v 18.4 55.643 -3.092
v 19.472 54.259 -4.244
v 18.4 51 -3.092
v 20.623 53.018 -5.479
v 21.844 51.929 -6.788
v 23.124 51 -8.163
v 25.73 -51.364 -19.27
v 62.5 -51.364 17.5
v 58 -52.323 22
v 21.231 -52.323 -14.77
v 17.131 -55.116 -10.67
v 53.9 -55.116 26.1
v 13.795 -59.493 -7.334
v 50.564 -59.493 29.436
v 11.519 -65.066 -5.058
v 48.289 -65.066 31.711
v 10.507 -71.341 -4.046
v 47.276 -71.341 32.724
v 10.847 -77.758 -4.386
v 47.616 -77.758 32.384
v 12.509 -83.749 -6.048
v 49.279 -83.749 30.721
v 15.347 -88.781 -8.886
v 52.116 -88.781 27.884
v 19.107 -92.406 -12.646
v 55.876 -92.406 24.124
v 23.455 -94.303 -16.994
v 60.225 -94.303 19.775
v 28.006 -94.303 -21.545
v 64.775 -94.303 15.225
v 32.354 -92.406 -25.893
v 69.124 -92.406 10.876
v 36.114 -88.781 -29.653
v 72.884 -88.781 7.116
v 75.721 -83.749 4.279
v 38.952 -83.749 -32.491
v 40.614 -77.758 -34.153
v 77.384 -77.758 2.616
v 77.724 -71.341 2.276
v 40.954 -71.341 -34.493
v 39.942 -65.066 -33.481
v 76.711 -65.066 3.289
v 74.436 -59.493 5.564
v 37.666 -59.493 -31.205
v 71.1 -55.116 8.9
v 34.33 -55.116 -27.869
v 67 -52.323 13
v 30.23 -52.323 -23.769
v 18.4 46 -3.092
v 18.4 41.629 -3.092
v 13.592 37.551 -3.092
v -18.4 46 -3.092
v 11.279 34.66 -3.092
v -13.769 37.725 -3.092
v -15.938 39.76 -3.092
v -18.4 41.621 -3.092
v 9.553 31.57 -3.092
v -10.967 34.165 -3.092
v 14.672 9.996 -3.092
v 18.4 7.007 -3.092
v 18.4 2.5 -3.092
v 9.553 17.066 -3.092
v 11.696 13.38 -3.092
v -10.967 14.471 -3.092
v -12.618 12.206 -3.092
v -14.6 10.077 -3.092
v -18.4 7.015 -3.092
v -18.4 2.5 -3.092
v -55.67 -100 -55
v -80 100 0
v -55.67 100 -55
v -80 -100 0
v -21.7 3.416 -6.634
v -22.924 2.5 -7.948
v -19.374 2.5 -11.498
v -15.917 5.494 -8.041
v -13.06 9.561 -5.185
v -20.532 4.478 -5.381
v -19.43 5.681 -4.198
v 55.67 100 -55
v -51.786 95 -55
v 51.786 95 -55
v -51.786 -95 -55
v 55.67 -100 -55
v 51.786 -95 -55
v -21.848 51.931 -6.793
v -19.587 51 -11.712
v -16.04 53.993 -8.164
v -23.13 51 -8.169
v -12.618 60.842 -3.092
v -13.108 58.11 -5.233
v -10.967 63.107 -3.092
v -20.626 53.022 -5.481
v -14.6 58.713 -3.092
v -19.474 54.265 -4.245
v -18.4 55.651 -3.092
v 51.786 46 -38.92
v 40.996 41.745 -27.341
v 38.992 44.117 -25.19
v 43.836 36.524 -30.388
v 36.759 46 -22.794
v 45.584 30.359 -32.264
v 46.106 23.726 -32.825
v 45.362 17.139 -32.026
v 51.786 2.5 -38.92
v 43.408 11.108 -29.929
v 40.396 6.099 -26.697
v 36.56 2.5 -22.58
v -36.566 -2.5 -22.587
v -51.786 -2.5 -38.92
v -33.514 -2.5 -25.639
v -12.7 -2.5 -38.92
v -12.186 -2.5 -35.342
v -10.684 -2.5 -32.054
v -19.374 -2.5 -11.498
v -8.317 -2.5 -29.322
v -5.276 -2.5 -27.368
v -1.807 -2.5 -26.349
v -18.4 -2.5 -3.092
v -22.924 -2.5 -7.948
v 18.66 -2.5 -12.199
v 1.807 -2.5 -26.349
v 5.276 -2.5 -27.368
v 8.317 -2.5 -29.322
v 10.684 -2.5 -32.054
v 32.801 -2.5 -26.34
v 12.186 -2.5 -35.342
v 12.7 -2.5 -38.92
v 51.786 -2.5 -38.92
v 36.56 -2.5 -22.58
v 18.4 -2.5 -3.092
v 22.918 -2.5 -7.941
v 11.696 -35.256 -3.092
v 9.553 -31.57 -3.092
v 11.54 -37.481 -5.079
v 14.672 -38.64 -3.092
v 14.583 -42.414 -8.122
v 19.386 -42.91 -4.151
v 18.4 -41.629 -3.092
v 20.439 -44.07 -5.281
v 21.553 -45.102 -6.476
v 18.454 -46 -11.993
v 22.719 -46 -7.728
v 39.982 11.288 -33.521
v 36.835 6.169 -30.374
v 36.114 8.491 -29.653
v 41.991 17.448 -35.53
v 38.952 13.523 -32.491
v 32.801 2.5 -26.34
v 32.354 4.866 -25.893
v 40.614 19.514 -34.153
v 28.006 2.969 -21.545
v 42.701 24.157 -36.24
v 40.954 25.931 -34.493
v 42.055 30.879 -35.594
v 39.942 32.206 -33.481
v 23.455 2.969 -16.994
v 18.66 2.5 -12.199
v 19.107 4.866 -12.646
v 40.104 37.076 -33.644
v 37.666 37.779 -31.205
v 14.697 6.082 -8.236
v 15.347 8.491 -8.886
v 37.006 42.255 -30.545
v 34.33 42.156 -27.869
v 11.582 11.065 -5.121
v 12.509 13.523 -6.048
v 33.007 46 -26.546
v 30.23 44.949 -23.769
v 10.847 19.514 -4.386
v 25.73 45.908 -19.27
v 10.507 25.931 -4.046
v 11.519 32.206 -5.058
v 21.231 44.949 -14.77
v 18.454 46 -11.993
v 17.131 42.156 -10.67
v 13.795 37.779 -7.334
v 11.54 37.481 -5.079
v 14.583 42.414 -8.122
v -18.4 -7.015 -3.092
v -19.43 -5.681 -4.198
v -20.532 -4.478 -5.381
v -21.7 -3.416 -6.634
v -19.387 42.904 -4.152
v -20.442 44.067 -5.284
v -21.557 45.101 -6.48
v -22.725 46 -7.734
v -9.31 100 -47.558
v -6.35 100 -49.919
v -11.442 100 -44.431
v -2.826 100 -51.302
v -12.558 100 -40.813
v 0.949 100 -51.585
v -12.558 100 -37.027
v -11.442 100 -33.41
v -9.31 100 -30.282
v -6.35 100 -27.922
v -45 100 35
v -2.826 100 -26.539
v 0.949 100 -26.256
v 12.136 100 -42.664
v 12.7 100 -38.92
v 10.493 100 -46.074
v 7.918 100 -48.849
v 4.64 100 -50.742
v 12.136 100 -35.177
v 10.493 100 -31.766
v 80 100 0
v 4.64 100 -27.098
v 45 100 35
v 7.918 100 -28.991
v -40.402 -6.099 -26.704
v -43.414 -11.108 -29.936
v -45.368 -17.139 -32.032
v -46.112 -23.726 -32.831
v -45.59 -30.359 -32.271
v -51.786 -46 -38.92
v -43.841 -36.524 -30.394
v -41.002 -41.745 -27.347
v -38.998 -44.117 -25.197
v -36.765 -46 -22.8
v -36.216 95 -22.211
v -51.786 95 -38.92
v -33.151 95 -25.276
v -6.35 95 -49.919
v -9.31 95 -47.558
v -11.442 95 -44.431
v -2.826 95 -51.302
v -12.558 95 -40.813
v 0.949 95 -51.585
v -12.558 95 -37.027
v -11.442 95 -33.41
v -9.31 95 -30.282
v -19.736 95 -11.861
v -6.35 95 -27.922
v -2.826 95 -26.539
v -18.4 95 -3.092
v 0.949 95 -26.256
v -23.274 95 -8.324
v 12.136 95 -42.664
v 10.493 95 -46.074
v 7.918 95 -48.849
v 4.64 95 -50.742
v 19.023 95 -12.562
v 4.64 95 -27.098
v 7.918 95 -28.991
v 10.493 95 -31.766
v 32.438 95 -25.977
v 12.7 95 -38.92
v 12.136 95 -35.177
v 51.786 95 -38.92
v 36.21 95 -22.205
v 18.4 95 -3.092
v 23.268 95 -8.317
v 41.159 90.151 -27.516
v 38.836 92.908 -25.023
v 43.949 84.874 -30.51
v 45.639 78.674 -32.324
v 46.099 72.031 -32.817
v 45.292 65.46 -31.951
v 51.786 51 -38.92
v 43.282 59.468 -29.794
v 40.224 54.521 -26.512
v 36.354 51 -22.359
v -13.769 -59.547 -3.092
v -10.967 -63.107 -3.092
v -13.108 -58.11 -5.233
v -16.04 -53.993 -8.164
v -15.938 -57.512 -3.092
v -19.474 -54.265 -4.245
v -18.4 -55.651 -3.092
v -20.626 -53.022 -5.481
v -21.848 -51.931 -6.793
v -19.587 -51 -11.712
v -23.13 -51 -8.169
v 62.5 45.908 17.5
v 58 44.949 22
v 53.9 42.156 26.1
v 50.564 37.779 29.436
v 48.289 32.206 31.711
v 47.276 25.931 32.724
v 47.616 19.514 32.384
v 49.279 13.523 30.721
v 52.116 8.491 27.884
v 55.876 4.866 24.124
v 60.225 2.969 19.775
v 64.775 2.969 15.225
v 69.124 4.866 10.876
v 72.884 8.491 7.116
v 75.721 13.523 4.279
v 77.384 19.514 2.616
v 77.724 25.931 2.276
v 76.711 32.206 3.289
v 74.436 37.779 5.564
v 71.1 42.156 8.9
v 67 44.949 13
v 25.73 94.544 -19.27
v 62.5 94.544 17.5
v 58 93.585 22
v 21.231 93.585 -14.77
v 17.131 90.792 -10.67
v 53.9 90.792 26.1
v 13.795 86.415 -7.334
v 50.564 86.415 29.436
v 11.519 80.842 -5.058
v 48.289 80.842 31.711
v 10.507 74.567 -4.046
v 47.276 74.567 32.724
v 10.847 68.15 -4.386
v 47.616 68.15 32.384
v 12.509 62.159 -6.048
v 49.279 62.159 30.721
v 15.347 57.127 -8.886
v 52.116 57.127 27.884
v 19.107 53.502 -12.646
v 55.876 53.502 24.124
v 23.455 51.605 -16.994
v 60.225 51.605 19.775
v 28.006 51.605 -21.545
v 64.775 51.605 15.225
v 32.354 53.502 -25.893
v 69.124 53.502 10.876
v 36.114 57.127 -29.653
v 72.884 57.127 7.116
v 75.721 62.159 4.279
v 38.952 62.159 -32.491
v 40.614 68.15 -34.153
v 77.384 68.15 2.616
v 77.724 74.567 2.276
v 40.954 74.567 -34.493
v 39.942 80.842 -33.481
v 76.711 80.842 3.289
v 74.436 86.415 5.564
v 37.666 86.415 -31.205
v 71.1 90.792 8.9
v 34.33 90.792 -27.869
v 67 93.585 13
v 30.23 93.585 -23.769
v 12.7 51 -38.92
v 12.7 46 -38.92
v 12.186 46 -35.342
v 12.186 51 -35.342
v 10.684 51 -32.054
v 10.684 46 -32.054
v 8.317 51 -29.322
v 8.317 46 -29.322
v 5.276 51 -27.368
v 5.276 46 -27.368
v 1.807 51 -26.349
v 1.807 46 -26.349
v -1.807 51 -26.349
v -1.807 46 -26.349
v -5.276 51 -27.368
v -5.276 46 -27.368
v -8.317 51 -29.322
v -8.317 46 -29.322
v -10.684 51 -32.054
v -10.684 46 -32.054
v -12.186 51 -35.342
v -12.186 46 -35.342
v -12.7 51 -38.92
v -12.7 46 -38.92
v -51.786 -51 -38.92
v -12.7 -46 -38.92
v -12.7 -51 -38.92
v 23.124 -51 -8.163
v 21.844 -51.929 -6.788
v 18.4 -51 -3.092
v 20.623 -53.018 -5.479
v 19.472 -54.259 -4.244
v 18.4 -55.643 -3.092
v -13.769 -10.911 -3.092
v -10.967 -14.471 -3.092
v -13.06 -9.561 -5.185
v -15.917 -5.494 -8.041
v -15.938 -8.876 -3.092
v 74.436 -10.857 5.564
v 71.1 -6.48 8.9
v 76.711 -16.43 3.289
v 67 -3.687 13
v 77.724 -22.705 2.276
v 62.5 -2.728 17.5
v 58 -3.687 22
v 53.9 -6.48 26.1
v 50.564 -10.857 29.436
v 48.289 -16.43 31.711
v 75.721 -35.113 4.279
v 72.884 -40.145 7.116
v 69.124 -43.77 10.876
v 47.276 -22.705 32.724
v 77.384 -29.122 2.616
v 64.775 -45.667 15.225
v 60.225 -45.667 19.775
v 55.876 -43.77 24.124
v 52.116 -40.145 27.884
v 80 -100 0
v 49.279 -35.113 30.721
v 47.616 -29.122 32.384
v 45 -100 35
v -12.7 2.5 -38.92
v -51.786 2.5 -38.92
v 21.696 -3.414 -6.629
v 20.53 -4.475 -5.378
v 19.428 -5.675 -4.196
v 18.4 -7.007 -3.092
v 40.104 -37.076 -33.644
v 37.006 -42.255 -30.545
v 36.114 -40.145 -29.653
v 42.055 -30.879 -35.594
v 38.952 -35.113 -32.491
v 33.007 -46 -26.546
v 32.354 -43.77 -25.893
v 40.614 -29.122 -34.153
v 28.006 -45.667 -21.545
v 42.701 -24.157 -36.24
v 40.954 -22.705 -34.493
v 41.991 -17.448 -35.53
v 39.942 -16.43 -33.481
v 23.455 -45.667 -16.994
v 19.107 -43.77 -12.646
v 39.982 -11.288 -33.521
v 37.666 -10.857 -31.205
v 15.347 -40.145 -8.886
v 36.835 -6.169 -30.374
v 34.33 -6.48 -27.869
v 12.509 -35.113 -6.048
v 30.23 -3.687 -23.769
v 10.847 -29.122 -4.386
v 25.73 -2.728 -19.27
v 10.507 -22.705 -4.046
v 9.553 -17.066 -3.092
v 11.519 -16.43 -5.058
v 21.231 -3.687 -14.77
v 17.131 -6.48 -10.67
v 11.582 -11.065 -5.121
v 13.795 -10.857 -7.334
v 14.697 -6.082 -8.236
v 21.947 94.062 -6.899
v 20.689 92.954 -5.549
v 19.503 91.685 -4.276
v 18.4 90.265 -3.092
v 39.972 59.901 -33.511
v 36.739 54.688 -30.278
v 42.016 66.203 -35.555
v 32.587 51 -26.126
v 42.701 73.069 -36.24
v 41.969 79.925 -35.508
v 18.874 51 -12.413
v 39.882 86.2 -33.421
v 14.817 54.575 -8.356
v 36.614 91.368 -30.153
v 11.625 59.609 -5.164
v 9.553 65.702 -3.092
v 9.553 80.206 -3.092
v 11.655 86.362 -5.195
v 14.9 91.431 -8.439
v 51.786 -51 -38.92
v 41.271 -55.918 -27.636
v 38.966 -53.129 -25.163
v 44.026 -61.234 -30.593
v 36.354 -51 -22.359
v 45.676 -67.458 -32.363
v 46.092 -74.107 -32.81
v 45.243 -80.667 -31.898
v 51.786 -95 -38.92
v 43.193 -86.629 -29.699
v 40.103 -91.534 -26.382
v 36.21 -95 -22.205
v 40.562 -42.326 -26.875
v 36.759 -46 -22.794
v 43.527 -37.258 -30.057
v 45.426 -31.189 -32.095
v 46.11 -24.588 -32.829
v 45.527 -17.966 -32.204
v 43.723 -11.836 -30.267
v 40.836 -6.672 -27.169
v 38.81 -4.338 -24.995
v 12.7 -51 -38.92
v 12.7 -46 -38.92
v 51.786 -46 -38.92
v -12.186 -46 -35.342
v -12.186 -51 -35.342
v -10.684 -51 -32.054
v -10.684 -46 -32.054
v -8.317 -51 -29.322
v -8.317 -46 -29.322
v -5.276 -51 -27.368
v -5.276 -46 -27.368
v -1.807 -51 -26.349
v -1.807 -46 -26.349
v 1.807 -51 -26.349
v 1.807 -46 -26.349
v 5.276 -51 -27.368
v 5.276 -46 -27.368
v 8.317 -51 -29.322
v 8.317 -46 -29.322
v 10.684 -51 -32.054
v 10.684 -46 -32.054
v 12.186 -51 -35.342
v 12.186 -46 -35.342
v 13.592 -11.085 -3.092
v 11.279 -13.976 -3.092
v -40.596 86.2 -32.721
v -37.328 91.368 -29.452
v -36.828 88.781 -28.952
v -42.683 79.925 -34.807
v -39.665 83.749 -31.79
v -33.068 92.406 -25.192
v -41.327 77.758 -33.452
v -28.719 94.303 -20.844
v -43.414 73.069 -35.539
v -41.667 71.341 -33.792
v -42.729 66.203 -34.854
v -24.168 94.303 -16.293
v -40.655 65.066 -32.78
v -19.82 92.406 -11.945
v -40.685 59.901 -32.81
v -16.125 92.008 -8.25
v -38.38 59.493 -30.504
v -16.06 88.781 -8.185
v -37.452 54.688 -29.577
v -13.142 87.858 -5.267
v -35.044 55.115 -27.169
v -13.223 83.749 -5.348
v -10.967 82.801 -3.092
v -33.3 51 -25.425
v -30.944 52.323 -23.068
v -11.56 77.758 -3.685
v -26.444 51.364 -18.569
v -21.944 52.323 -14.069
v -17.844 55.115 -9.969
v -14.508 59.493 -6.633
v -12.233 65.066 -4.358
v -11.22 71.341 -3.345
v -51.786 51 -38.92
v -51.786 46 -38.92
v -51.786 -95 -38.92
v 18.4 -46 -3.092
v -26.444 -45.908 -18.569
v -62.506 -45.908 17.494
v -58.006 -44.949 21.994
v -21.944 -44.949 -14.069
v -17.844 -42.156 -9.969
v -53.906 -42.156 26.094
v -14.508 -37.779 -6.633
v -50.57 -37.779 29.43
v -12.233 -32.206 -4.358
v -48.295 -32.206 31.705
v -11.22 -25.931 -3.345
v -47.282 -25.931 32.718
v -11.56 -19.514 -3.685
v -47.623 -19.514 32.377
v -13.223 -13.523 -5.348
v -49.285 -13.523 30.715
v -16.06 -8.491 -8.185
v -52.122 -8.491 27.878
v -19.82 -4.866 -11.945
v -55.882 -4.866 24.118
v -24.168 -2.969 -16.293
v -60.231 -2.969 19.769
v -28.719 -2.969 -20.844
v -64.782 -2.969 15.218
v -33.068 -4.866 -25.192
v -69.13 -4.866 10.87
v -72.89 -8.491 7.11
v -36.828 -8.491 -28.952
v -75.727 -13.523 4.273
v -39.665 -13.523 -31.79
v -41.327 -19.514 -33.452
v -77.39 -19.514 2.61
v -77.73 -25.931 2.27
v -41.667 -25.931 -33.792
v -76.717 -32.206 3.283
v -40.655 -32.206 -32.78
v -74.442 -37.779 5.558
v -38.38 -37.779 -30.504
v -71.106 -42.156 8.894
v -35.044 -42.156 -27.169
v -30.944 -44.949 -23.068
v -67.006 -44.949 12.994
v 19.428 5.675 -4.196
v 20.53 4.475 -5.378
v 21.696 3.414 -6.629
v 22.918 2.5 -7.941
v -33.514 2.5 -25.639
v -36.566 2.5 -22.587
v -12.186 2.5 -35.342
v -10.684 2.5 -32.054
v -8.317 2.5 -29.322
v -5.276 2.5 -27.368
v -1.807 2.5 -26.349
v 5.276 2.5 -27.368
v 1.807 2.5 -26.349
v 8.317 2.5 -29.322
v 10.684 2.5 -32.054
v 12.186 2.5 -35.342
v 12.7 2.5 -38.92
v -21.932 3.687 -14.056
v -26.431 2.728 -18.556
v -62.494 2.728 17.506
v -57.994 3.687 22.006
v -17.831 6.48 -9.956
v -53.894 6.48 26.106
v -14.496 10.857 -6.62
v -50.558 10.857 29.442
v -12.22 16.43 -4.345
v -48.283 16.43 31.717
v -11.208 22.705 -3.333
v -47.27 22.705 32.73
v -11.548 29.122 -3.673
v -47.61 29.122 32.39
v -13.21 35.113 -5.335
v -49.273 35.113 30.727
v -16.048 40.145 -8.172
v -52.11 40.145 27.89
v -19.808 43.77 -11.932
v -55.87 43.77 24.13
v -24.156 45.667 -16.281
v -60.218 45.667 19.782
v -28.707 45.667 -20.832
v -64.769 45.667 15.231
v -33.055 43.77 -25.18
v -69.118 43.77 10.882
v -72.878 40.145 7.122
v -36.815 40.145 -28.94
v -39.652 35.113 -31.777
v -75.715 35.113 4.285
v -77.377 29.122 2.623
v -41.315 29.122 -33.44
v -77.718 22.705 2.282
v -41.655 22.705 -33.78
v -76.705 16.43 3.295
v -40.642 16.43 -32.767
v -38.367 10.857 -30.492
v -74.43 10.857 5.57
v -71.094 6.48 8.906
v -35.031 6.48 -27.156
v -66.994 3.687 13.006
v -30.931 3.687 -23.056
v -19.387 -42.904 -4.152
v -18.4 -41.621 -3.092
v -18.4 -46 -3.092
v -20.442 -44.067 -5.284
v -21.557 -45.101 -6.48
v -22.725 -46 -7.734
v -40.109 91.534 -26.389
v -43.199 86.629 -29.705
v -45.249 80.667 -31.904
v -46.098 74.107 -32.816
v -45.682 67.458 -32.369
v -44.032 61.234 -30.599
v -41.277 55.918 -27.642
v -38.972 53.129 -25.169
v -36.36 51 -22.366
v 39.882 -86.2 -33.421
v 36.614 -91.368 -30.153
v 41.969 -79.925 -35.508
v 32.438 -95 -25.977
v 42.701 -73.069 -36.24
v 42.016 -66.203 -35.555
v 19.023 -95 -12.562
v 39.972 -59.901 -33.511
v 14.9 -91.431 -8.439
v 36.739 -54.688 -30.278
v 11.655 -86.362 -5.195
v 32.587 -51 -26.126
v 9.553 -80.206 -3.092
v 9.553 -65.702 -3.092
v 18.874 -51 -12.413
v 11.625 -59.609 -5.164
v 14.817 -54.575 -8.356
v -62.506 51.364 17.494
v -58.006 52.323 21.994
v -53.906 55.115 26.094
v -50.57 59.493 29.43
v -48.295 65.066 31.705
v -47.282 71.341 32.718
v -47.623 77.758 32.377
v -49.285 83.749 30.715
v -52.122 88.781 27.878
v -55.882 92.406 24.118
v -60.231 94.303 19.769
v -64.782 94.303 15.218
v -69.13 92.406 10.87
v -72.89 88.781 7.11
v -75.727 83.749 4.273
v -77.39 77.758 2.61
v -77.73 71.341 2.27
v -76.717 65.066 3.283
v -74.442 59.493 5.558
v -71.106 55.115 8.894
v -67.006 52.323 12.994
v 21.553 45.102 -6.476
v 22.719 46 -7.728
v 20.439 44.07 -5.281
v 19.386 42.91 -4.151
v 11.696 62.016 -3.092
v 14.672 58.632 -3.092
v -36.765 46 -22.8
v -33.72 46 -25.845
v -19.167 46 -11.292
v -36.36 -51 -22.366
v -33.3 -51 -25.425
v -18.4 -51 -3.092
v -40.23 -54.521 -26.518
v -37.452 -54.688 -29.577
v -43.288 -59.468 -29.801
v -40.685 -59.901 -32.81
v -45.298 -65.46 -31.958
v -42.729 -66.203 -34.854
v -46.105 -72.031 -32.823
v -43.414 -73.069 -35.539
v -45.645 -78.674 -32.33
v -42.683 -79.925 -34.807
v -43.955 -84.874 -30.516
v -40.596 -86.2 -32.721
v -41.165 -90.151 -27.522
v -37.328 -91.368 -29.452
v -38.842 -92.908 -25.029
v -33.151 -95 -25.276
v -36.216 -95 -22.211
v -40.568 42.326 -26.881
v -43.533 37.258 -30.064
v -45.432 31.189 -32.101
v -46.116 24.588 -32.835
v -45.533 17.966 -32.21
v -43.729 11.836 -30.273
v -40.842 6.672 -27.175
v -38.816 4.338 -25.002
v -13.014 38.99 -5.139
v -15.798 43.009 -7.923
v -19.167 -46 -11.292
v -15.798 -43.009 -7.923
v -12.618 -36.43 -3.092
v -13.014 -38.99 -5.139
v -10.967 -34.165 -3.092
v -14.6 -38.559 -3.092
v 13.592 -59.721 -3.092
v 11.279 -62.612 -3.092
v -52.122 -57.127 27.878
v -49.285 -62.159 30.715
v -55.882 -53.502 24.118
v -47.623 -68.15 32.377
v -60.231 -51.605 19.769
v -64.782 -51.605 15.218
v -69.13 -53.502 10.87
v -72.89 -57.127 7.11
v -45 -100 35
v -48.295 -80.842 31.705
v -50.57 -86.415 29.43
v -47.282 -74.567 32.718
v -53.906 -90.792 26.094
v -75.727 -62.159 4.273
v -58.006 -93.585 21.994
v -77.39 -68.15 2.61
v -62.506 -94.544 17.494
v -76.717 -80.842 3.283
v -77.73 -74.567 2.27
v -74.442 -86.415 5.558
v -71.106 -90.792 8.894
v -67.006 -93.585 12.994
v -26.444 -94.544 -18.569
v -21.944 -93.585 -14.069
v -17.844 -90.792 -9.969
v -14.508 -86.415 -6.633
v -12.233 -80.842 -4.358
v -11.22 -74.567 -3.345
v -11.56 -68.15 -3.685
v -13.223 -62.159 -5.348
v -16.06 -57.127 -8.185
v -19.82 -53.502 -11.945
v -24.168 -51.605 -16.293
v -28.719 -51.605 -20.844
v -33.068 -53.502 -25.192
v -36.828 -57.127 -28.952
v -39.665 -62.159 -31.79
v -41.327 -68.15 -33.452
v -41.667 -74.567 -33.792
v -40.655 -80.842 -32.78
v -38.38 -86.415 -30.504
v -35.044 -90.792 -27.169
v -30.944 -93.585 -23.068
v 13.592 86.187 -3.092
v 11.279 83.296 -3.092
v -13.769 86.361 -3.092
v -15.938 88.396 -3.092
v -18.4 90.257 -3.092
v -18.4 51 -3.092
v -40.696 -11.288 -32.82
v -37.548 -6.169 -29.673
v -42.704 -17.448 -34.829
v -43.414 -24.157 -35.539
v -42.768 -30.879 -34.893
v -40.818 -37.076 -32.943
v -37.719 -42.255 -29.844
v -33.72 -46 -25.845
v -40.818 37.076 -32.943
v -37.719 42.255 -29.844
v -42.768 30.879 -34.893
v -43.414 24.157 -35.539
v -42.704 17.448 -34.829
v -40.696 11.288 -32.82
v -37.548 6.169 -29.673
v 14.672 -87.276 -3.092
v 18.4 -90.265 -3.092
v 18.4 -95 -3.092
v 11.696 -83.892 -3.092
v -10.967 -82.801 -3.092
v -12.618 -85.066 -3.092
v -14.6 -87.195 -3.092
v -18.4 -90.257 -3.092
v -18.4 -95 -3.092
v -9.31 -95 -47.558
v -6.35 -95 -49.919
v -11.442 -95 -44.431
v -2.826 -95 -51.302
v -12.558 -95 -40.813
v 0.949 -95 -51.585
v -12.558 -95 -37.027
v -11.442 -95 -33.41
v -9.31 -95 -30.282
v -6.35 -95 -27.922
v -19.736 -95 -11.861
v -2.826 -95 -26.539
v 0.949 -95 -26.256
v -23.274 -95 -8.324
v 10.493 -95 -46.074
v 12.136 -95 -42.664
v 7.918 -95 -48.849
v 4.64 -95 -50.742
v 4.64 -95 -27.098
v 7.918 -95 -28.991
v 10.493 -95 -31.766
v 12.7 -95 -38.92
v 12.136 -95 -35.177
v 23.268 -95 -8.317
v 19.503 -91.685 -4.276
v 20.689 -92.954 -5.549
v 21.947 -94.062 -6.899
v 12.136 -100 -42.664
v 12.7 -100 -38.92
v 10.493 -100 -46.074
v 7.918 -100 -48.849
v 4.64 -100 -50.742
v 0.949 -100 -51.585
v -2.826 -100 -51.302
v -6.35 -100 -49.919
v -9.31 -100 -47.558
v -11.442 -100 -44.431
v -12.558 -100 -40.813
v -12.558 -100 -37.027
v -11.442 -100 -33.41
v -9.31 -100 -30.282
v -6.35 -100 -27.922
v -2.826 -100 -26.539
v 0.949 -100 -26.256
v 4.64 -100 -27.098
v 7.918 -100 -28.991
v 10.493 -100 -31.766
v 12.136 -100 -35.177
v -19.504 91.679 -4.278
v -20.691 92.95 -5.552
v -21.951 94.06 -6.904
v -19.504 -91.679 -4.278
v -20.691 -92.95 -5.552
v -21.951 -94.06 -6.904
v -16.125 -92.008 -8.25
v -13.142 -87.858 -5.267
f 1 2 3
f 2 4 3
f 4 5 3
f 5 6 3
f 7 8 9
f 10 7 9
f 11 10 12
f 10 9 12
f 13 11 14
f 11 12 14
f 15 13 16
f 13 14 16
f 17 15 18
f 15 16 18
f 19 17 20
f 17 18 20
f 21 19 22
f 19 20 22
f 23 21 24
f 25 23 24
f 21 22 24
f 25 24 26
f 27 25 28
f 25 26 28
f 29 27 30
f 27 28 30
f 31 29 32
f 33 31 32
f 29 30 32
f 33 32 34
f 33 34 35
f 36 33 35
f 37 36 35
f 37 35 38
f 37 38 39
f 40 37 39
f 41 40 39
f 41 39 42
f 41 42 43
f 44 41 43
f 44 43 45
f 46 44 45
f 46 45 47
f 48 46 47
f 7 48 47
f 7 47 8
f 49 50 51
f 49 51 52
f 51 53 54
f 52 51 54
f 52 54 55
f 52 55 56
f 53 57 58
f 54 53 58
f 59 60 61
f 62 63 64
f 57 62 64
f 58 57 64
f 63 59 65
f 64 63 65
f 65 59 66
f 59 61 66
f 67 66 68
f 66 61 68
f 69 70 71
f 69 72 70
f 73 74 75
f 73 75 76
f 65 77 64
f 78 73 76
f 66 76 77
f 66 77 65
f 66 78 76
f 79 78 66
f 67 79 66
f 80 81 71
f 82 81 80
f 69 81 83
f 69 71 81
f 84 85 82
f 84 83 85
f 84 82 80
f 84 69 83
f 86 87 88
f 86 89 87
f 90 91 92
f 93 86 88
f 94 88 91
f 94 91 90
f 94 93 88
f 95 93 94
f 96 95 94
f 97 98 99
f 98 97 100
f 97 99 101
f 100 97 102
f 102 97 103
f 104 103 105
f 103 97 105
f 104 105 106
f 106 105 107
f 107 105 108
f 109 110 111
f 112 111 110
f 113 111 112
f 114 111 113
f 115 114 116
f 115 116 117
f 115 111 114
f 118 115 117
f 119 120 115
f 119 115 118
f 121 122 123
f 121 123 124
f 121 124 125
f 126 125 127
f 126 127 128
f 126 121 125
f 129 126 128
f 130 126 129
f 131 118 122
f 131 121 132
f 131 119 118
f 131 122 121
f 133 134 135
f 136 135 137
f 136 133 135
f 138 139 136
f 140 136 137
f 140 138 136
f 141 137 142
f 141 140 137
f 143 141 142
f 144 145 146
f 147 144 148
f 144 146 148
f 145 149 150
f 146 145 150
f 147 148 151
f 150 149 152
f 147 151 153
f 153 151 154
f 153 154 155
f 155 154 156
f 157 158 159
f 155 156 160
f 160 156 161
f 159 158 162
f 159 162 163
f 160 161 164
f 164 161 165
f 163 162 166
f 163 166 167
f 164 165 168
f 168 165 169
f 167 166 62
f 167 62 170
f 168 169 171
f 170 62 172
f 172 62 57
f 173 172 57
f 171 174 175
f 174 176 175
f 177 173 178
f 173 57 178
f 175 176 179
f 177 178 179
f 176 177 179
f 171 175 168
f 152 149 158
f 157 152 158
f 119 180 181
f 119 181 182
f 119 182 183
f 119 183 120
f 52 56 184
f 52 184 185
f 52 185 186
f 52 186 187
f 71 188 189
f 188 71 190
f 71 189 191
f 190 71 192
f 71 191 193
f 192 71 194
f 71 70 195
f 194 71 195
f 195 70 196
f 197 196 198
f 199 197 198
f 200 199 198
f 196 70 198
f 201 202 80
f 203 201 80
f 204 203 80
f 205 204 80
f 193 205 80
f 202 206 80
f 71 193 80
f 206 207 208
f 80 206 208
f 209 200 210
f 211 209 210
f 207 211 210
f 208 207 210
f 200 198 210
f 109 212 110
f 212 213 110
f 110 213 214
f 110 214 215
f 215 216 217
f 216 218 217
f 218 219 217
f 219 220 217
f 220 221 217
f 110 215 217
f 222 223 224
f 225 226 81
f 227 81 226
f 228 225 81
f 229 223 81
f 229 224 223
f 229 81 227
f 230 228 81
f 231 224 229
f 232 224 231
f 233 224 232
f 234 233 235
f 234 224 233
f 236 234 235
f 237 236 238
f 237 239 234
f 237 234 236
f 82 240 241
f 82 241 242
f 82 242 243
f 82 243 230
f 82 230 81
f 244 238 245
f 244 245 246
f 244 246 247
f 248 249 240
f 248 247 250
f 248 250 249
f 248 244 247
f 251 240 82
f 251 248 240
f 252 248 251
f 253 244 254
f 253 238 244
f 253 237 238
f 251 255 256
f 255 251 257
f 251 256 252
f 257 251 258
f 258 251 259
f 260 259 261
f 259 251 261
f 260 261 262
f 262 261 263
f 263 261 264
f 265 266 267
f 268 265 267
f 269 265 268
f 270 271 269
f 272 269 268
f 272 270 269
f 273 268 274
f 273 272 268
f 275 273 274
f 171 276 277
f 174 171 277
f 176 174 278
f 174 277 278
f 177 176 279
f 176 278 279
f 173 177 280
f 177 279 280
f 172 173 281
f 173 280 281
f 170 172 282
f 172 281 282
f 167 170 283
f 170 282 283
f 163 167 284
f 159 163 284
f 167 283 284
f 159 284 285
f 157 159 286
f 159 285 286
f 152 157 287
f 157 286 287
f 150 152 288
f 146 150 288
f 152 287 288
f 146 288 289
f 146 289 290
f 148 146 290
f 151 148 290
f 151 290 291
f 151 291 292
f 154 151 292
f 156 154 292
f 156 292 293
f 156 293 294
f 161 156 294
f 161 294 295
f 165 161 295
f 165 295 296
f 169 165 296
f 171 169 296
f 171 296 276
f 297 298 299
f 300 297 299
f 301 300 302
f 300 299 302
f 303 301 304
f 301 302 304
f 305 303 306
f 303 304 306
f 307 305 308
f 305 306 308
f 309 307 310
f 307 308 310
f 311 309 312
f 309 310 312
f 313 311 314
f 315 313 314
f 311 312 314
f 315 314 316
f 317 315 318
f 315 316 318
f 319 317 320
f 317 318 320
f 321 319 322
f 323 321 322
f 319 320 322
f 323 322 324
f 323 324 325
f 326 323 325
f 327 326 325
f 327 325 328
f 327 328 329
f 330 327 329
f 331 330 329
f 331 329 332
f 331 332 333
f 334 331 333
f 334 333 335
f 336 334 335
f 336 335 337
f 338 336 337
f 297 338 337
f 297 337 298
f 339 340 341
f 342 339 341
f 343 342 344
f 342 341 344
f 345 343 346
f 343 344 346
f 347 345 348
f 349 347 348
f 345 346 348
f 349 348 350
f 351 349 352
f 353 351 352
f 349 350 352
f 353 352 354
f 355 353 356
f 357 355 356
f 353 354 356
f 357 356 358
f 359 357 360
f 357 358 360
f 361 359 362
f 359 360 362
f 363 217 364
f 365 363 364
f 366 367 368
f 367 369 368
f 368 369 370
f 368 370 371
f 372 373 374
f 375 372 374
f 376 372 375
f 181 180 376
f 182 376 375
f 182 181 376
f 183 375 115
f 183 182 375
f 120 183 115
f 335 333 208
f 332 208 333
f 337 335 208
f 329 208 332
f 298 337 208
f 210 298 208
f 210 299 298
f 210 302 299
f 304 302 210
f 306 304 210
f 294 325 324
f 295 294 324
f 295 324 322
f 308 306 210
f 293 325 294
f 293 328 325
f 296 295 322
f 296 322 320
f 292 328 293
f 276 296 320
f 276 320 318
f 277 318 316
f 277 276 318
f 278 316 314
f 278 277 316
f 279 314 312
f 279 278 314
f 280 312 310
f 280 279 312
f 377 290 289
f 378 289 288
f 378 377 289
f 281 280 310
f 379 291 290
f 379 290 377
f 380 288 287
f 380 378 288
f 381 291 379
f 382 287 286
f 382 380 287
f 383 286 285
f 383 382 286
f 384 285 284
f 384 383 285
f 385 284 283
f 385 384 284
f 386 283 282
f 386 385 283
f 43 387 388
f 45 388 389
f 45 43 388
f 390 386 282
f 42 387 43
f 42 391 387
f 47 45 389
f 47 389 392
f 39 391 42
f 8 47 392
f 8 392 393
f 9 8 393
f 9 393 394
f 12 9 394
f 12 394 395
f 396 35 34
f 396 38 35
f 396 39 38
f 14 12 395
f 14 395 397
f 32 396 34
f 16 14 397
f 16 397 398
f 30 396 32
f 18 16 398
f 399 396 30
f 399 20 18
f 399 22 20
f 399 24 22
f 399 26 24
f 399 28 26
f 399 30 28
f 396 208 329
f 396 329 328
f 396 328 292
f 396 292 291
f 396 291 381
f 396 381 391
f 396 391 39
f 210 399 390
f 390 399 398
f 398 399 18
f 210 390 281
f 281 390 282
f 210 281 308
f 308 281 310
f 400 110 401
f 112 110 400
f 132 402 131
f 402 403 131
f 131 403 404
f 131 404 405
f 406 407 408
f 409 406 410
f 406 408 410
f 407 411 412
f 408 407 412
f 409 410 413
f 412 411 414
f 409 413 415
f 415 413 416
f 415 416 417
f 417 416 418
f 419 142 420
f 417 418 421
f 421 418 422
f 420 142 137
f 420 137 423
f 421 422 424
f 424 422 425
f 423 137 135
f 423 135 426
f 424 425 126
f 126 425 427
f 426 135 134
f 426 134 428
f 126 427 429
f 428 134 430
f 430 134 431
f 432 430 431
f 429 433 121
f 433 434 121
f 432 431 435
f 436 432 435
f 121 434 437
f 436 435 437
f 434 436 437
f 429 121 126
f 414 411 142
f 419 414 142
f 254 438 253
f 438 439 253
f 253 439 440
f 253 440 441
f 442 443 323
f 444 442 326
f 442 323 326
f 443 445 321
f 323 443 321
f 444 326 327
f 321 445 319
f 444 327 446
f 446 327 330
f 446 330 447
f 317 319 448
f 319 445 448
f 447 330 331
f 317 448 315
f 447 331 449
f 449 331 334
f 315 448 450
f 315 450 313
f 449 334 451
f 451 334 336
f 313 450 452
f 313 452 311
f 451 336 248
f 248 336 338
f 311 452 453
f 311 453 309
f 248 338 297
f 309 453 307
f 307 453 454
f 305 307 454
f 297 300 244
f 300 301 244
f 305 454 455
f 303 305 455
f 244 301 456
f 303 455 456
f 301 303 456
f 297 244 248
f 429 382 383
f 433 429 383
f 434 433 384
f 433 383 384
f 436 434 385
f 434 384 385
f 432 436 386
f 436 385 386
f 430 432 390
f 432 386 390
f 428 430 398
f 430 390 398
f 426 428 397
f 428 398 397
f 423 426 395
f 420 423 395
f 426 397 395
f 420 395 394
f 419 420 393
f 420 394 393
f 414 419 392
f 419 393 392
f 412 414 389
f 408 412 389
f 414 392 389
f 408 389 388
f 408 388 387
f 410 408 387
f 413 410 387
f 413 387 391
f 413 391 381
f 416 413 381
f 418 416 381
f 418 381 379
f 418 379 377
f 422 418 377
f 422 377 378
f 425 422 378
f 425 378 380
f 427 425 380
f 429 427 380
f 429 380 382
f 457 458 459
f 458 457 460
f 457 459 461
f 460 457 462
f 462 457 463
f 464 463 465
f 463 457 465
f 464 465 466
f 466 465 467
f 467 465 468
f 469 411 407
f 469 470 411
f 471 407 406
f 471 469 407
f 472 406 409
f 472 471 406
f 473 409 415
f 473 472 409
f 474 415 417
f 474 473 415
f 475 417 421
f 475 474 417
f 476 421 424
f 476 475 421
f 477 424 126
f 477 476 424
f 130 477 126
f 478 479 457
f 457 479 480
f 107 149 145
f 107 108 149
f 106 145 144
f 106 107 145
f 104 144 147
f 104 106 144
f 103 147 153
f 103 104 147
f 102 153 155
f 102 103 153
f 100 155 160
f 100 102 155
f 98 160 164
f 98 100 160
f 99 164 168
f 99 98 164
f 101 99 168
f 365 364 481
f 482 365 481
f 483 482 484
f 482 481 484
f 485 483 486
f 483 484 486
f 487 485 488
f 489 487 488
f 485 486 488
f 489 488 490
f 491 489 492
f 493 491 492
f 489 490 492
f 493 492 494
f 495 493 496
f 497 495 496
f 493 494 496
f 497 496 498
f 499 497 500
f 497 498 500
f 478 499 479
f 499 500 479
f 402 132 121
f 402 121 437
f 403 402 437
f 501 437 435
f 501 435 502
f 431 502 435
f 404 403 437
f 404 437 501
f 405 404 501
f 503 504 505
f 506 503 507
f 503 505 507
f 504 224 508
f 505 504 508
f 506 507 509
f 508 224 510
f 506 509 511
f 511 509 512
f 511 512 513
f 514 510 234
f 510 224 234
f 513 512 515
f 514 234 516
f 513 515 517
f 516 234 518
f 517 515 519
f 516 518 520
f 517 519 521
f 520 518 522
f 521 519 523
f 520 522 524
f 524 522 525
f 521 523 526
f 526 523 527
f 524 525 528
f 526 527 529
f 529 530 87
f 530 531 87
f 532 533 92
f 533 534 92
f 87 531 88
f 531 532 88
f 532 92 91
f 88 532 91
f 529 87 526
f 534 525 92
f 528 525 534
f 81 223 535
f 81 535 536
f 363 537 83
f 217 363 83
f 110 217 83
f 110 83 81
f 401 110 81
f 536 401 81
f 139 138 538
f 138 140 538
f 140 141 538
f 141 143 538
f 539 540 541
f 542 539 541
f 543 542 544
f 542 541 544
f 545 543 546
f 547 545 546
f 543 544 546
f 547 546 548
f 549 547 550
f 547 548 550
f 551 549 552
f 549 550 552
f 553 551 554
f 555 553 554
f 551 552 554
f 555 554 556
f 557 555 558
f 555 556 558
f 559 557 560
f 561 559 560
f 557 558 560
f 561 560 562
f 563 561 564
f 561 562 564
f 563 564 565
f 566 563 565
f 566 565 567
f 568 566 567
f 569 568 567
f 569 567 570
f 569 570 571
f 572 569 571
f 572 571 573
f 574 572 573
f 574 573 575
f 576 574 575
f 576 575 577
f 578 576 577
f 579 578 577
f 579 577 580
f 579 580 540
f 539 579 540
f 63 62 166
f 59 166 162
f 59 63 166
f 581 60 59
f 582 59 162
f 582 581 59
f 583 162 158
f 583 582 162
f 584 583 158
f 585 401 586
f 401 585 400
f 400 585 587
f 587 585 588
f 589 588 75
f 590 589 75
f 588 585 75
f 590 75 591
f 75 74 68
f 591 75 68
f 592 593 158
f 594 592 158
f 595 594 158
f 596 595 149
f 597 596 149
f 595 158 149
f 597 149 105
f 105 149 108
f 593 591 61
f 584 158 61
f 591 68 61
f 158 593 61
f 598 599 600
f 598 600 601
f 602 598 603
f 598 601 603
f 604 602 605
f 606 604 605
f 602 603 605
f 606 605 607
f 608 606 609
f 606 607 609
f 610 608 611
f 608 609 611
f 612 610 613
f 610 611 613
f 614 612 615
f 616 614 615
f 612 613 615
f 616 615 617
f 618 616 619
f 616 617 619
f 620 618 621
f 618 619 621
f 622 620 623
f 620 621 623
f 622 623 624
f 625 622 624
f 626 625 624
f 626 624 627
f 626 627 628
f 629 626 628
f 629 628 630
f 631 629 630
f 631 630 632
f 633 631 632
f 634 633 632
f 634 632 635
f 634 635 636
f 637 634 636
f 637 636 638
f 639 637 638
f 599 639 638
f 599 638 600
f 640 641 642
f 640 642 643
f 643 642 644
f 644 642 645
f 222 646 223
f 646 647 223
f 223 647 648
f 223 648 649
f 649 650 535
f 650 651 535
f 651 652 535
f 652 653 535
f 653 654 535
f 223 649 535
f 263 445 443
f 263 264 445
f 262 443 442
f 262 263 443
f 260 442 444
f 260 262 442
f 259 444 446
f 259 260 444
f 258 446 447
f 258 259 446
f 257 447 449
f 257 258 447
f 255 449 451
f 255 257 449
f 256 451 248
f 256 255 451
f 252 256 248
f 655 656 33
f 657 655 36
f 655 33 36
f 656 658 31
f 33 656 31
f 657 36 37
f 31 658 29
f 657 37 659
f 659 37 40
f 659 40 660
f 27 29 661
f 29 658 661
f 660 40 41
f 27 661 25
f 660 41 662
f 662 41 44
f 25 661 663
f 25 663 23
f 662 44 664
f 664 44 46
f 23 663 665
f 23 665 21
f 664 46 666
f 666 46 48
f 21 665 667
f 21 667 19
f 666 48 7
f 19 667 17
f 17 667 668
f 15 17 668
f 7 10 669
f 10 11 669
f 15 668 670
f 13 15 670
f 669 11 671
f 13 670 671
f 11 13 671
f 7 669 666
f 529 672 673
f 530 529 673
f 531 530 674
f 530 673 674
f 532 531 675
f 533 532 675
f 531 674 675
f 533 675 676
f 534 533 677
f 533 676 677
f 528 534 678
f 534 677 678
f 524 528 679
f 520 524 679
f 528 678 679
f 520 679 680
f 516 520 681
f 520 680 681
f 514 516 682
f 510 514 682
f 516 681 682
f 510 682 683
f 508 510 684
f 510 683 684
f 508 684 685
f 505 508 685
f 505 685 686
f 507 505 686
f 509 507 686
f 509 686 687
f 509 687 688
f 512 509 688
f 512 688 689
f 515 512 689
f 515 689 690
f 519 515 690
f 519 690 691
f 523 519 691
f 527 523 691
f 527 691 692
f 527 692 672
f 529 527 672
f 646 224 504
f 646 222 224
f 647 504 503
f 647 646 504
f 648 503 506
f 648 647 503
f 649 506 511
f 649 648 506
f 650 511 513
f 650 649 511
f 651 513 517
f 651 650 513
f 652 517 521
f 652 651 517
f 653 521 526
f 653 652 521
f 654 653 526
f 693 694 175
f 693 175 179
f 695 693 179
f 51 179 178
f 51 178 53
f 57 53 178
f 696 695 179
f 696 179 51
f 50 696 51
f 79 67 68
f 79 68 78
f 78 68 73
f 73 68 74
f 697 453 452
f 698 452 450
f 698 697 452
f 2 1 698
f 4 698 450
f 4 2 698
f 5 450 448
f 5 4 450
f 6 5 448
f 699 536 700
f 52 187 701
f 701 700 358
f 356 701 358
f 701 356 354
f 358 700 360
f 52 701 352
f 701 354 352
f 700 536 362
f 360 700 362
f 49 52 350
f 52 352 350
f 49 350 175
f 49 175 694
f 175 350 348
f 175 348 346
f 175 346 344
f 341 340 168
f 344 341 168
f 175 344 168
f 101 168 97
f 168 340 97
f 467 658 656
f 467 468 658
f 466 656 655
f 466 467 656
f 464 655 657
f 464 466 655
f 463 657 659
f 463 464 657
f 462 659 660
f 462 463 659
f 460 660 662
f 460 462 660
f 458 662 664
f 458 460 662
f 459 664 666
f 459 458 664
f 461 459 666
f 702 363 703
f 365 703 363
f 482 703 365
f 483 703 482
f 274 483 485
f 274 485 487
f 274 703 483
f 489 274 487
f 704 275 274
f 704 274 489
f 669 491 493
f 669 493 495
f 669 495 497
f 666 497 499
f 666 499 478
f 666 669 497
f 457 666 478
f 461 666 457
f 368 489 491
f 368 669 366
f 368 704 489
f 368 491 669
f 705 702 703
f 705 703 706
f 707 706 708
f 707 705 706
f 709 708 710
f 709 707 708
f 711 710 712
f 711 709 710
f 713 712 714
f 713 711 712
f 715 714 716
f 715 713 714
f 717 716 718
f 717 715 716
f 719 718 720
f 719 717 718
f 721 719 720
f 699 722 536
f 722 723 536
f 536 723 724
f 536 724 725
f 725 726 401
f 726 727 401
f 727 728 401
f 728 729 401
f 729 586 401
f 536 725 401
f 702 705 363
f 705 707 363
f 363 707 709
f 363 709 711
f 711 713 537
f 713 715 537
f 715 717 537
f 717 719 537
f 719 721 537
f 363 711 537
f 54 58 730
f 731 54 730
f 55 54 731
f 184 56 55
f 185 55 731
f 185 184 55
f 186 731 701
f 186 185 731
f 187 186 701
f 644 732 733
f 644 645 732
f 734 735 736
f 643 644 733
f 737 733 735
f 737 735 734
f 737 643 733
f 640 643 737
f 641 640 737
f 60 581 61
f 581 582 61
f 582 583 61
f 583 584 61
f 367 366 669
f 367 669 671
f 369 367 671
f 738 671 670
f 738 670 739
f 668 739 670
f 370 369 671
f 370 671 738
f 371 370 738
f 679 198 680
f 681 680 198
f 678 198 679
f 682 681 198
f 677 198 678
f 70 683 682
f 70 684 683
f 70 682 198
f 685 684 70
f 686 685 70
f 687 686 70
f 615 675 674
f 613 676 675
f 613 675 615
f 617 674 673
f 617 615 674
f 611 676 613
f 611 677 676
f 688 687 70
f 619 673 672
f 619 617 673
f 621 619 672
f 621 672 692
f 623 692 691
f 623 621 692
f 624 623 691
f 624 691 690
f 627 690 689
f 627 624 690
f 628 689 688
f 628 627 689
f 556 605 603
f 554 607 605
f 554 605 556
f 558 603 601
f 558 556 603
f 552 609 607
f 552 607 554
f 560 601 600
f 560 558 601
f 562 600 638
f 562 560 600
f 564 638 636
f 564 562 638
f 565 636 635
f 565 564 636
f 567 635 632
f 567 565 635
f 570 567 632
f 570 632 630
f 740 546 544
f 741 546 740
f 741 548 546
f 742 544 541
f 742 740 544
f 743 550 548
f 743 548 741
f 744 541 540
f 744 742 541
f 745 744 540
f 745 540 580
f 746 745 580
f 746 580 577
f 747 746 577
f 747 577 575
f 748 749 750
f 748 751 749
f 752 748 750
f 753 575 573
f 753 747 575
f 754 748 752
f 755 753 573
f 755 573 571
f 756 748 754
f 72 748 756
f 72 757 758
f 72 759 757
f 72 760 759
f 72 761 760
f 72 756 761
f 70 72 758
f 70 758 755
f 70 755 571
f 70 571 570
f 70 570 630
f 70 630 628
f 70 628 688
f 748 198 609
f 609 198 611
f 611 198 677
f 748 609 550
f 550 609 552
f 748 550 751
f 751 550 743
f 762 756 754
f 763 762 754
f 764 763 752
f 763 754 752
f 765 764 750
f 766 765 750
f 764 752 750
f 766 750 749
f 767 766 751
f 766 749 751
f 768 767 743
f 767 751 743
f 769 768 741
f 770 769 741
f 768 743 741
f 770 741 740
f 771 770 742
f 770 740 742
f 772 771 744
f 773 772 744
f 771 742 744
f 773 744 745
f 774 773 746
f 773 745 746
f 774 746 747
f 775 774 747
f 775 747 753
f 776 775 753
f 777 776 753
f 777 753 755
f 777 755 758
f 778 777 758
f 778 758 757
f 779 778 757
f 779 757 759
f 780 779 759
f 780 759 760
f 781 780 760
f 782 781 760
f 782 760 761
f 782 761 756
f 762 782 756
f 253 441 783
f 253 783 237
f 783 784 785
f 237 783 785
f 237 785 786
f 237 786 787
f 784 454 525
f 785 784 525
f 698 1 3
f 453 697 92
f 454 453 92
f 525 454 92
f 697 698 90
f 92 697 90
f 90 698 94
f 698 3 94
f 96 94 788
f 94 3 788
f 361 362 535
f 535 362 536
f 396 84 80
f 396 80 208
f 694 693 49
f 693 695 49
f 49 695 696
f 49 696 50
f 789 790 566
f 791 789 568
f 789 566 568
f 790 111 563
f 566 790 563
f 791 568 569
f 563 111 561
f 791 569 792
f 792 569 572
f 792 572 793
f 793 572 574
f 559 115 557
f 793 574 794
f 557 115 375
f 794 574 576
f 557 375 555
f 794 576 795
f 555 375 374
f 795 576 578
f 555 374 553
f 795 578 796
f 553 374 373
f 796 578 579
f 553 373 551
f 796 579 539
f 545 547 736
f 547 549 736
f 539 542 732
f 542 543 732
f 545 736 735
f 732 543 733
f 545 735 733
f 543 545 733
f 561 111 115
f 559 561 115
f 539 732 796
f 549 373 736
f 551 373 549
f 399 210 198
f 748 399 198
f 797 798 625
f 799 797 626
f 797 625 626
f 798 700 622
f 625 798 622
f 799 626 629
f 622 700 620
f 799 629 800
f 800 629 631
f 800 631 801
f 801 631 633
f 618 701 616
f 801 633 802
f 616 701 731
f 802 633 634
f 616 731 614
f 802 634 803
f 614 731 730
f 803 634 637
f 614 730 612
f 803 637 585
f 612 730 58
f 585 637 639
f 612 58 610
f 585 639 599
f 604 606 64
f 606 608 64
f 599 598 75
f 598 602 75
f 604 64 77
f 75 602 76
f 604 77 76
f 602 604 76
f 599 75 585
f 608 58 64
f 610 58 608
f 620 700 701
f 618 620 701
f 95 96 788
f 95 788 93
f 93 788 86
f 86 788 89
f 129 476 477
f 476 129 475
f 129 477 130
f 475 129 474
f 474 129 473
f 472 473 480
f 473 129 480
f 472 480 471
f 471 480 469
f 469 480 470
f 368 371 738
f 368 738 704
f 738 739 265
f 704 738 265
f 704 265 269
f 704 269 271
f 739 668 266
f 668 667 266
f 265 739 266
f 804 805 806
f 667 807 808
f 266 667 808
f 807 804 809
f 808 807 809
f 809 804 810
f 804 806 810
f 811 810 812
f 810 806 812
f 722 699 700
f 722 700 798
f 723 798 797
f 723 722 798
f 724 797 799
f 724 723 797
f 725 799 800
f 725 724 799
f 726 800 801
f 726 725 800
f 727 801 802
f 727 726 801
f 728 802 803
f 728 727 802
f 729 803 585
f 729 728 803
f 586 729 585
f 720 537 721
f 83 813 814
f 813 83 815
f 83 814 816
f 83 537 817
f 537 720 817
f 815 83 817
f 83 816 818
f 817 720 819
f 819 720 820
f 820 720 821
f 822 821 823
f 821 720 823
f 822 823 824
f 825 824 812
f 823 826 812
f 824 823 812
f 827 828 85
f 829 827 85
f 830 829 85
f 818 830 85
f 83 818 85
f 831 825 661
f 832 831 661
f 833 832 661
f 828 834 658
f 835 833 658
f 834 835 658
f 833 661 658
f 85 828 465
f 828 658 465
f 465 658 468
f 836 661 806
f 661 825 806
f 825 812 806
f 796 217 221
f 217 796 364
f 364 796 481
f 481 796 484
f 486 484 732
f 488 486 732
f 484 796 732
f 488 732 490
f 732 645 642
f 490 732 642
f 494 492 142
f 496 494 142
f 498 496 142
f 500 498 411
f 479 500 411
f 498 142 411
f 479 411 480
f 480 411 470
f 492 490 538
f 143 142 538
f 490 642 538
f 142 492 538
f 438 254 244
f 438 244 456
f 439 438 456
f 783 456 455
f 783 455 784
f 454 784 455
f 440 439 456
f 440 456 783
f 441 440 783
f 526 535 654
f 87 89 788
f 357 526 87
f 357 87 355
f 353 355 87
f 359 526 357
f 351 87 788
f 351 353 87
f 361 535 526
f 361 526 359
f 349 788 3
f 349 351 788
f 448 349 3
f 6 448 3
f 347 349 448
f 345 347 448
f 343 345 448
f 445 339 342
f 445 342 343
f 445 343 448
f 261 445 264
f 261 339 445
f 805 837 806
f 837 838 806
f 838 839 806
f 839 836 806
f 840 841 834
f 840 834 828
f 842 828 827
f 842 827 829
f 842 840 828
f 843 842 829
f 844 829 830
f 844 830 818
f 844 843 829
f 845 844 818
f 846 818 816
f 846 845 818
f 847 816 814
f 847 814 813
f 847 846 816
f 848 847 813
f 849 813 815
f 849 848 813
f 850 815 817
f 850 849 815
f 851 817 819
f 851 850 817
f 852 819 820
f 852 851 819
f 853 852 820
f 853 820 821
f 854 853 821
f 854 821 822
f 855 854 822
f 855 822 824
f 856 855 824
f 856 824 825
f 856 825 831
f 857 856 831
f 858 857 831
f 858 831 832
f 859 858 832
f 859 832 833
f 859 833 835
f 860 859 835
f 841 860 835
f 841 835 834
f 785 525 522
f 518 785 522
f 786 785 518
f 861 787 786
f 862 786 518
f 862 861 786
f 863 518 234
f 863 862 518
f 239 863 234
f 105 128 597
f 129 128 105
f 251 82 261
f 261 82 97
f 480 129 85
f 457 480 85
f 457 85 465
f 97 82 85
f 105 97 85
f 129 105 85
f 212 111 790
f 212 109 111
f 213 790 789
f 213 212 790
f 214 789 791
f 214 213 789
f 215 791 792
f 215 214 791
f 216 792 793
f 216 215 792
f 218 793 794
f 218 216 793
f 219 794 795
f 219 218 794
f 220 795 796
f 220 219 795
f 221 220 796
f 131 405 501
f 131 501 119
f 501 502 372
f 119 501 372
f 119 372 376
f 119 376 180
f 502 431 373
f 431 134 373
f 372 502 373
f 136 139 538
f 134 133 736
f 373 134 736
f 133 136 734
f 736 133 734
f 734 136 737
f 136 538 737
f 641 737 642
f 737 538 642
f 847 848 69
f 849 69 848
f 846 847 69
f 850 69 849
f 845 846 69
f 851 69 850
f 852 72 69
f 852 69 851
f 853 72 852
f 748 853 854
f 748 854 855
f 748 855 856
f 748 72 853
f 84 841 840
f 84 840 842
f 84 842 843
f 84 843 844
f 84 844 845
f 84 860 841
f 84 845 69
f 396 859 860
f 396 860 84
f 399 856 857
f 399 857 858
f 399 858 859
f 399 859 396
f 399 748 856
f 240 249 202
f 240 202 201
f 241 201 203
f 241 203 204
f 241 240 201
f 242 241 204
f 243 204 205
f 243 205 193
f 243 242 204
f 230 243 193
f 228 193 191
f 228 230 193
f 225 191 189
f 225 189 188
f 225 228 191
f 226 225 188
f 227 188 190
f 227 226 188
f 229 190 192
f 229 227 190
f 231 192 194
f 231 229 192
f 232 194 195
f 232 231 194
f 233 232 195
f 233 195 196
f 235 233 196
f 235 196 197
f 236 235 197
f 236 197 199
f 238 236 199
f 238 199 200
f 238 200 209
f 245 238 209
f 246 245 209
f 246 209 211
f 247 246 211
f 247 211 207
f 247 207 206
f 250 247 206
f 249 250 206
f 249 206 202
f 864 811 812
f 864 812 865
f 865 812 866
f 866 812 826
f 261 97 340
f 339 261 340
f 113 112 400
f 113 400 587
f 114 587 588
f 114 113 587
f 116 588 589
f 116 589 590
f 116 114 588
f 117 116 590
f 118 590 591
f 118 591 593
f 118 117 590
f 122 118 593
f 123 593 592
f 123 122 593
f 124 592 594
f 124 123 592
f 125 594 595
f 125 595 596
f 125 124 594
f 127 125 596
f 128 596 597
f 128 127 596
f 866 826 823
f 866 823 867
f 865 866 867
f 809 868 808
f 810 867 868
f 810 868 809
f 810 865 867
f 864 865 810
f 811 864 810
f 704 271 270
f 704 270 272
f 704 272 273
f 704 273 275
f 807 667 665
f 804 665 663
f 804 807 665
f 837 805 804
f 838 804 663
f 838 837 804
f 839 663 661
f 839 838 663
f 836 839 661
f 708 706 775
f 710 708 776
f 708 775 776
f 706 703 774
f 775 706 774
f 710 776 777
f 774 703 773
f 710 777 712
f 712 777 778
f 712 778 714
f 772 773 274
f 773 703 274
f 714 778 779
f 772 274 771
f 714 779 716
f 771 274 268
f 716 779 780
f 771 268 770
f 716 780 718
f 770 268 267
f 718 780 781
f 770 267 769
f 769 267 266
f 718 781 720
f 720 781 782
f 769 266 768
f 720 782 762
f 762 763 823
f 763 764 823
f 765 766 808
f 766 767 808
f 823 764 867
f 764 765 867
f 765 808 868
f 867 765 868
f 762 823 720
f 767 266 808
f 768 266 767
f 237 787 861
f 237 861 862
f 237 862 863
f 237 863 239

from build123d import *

# Parameters (mm, degrees)
F1_DEPTH  = 100
F2_R      = 21.59
F4_DEPTH  = 52
F3_R      = 21.59
F5_DEPTH  = 52
F6_DEPTH  = 2.5
F7_DEPTH  = 95
F8_DEPTH  = 2.5
F3_R_2    = 24
F9_DEPTH  = 51
F10_START = 43.5
F10_DEPTH = 5
F11_START = 43.5
F11_DEPTH = 5
F2_R_2    = 24
F12_DEPTH = 52


# Not quite as in the source:
# - a feature names something its author has since deleted; it is built from what else it names


with BuildPart() as f1:
    # F0 (on Front) → F1 (new body, symmetric)
    with BuildSketch(Plane.XZ):
        Polygon((-80, 0), (-55.6696653366, -55), (-51.7864015908, -55), (-51.7864015908, -38.9201976359), (-18.3995570987, -3.0922384467), (18.3995570987, -3.0922384467), (51.7864015908, -38.9201976359), (51.7864015908, -55), (55.6696653366, -55), (80, 0), (45, 35), (-45, 35), align=None)
        with BuildLine():
            Line((-18.3995570987, -3.0922384467), (-51.7864015908, -38.9201976359))
            Line((-51.7864015908, -38.9201976359), (-12.7, -38.9201976359))
            ThreePointArc((-12.7, -38.9201976359), (0, -26.2201976359), (12.7, -38.9201976359))
            Line((12.7, -38.9201976359), (51.7864015908, -38.9201976359))
            Line((51.7864015908, -38.9201976359), (18.3995570987, -3.0922384467))
            Line((18.3995570987, -3.0922384467), (-18.3995570987, -3.0922384467))
        make_face()
        with BuildLine():
            Line((-51.7864015908, -38.9201976359), (-51.7864015908, -55))
            Line((-51.7864015908, -55), (51.7864015908, -55))
            Line((51.7864015908, -55), (51.7864015908, -38.9201976359))
            Line((51.7864015908, -38.9201976359), (12.7, -38.9201976359))
            ThreePointArc((12.7, -38.9201976359), (0, -51.6201976359), (-12.7, -38.9201976359))
            Line((-12.7, -38.9201976359), (-51.7864015908, -38.9201976359))
        make_face()
    extrude(amount=F1_DEPTH, both=True)

    # F2 (on face) → F4 (cut)
    with BuildSketch(Plane(origin=(40, 0, 40), x_dir=(0, 1, 0), z_dir=(0.7071067812, 0, 0.7071067812))):
        with Locations((72.954, -31.8198008825)):
            Circle(F2_R)
        with Locations((24.318, -31.8198008825)):
            Circle(F2_R)
        with Locations((-24.318, -31.8198008824)):
            Circle(F2_R)
        with Locations((-72.954, -31.8198008825)):
            Circle(F2_R)
    extrude(amount=-F4_DEPTH, mode=Mode.SUBTRACT)

    # F3 (on face) → F5 (cut)
    with BuildSketch(Plane(origin=(-40, 0, 40), x_dir=(0, -1, 0), z_dir=(-0.7071067812, 0, 0.7071067812))):
        with Locations((-72.9539923101, -31.8285424949)):
            Circle(F3_R)
        with Locations((-24.3179954494, -31.8110678119)):
            Circle(F3_R)
        with Locations((24.3180014113, -31.8285424949)):
            Circle(F3_R)
        with Locations((72.9540014113, -31.8285424949)):
            Circle(F3_R)
    extrude(amount=-F5_DEPTH, mode=Mode.SUBTRACT)

    # F0 (on Front) → F6 (join, symmetric)
    with BuildSketch(Plane.XZ):
        with BuildLine():
            Line((-18.3995570987, -3.0922384467), (-51.7864015908, -38.9201976359))
            Line((-51.7864015908, -38.9201976359), (-12.7, -38.9201976359))
            ThreePointArc((-12.7, -38.9201976359), (0, -26.2201976359), (12.7, -38.9201976359))
            Line((12.7, -38.9201976359), (51.7864015908, -38.9201976359))
            Line((51.7864015908, -38.9201976359), (18.3995570987, -3.0922384467))
            Line((18.3995570987, -3.0922384467), (-18.3995570987, -3.0922384467))
        make_face()
    extrude(amount=F6_DEPTH, both=True)

    # F0 (on Front) → F7 (cut, symmetric)
    with BuildSketch(Plane.XZ):
        with BuildLine():
            Line((-18.3995570987, -3.0922384467), (-51.7864015908, -38.9201976359))
            Line((-51.7864015908, -38.9201976359), (-12.7, -38.9201976359))
            ThreePointArc((-12.7, -38.9201976359), (0, -26.2201976359), (12.7, -38.9201976359))
            Line((12.7, -38.9201976359), (51.7864015908, -38.9201976359))
            Line((51.7864015908, -38.9201976359), (18.3995570987, -3.0922384467))
            Line((18.3995570987, -3.0922384467), (-18.3995570987, -3.0922384467))
        make_face()
        with BuildLine():
            Line((-51.7864015908, -38.9201976359), (-51.7864015908, -55))
            Line((-51.7864015908, -55), (51.7864015908, -55))
            Line((51.7864015908, -55), (51.7864015908, -38.9201976359))
            Line((51.7864015908, -38.9201976359), (12.7, -38.9201976359))
            ThreePointArc((12.7, -38.9201976359), (0, -51.6201976359), (-12.7, -38.9201976359))
            Line((-12.7, -38.9201976359), (-51.7864015908, -38.9201976359))
        make_face()
    extrude(amount=F7_DEPTH, both=True, mode=Mode.SUBTRACT)

    # F0 (on Front) → F8 (join, symmetric)
    with BuildSketch(Plane.XZ):
        with BuildLine():
            Line((-18.3995570987, -3.0922384467), (-51.7864015908, -38.9201976359))
            Line((-51.7864015908, -38.9201976359), (-12.7, -38.9201976359))
            ThreePointArc((-12.7, -38.9201976359), (0, -26.2201976359), (12.7, -38.9201976359))
            Line((12.7, -38.9201976359), (51.7864015908, -38.9201976359))
            Line((51.7864015908, -38.9201976359), (18.3995570987, -3.0922384467))
            Line((18.3995570987, -3.0922384467), (-18.3995570987, -3.0922384467))
        make_face()
    extrude(amount=F8_DEPTH, both=True)



with BuildPart() as f9:
    # F3 (on face) → F9 (new body)
    with BuildSketch(Plane(origin=(-40, 0, 40), x_dir=(0, -1, 0), z_dir=(-0.7071067812, 0, 0.7071067812))):
        with Locations((24.3180014113, -31.8285424949)):
            Circle(F3_R_2)
        with Locations((24.3180014113, -31.8285424949)):
            Circle(F3_R, mode=Mode.SUBTRACT)
    extrude(amount=-F9_DEPTH)


with BuildPart() as f9b:
    # F3 (on face) → F9, piece 2 (new body)
    with BuildSketch(Plane(origin=(-40, 0, 40), x_dir=(0, -1, 0), z_dir=(-0.7071067812, 0, 0.7071067812))):
        with Locations((72.9540014113, -31.8285424949)):
            Circle(F3_R_2)
        with Locations((72.9540014113, -31.8285424949)):
            Circle(F3_R, mode=Mode.SUBTRACT)
    extrude(amount=-F9_DEPTH)


with BuildPart() as f9c:
    # F3 (on face) → F9, piece 3 (new body)
    with BuildSketch(Plane(origin=(-40, 0, 40), x_dir=(0, -1, 0), z_dir=(-0.7071067812, 0, 0.7071067812))):
        with Locations((-24.3180014113, -31.8285424949)):
            Circle(F3_R_2)
        with Locations((-24.3179954494, -31.8110678119)):
            Circle(F3_R, mode=Mode.SUBTRACT)
    extrude(amount=-F9_DEPTH)


with BuildPart() as f9d:
    # F3 (on face) → F9, piece 4 (new body)
    with BuildSketch(Plane(origin=(-40, 0, 40), x_dir=(0, -1, 0), z_dir=(-0.7071067812, 0, 0.7071067812))):
        with Locations((-72.9540014113, -31.8285424949)):
            Circle(F3_R_2)
        with Locations((-72.9539923101, -31.8285424949)):
            Circle(F3_R, mode=Mode.SUBTRACT)
    extrude(amount=-F9_DEPTH)


with BuildPart() as f1_1:
    add(f1.part)

    add(f9.part)  # F10 merges F9

    add(f9b.part)  # F10 merges F9b
    # F8_face (on face) → F10 (join)
    with BuildSketch(Plane(origin=(0, -2.5, -22.7617883235), x_dir=(1, 0, 0), z_dir=(0, -1, 0)).offset(F10_START)):
        with BuildLine():
            Line((-18.3995570987, 19.6695498768), (-51.7864015908, -16.1584093124))
            Line((-51.7864015908, -16.1584093124), (-12.7, -16.1584093124))
            ThreePointArc((-12.7, -16.1584093124), (0, -3.4584093124), (12.7, -16.1584093124))
            Line((12.7, -16.1584093124), (51.7864015908, -16.1584093124))
            Line((51.7864015908, -16.1584093124), (18.3995570987, 19.6695498768))
            Line((18.3995570987, 19.6695498768), (-18.3995570987, 19.6695498768))
        make_face()
    extrude(amount=F10_DEPTH)


    add(f9c.part)  # F11 merges F9c

    add(f9d.part)  # F11 merges F9d
    # F8_face1 (on face) → F11 (join)
    with BuildSketch(Plane(origin=(0, 2.5, -22.7617883235), x_dir=(1, 0, 0), z_dir=(0, 1, 0)).offset(F11_START)):
        with BuildLine():
            Line((-51.7864015908, 16.1584093124), (-18.3995570987, -19.6695498768))
            Line((-18.3995570987, -19.6695498768), (18.3995570987, -19.6695498768))
            Line((18.3995570987, -19.6695498768), (51.7864015908, 16.1584093124))
            Line((51.7864015908, 16.1584093124), (12.7, 16.1584093124))
            ThreePointArc((12.7, 16.1584093124), (0, 3.4584093124), (-12.7, 16.1584093124))
            Line((-12.7, 16.1584093124), (-51.7864015908, 16.1584093124))
        make_face()
    extrude(amount=F11_DEPTH)


with BuildPart() as f12:
    # F2 (on face) → F12 (new body)
    with BuildSketch(Plane(origin=(40, 0, 40), x_dir=(0, 1, 0), z_dir=(0.7071067812, 0, 0.7071067812))):
        with Locations((-72.954, -31.8198008825)):
            Circle(F2_R_2)
        with Locations((-72.954, -31.8198008825)):
            Circle(F2_R, mode=Mode.SUBTRACT)
    extrude(amount=-F12_DEPTH)


with BuildPart() as f12b:
    # F2 (on face) → F12, piece 2 (new body)
    with BuildSketch(Plane(origin=(40, 0, 40), x_dir=(0, 1, 0), z_dir=(0.7071067812, 0, 0.7071067812))):
        with Locations((-24.318, -31.8198008824)):
            Circle(F2_R_2)
        with Locations((-24.318, -31.8198008824)):
            Circle(F2_R, mode=Mode.SUBTRACT)
    extrude(amount=-F12_DEPTH)


with BuildPart() as f12c:
    # F2 (on face) → F12, piece 3 (new body)
    with BuildSketch(Plane(origin=(40, 0, 40), x_dir=(0, 1, 0), z_dir=(0.7071067812, 0, 0.7071067812))):
        with Locations((24.318, -31.8198008825)):
            Circle(F2_R_2)
        with Locations((24.318, -31.8198008825)):
            Circle(F2_R, mode=Mode.SUBTRACT)
    extrude(amount=-F12_DEPTH)


with BuildPart() as f12d:
    # F2 (on face) → F12, piece 4 (new body)
    with BuildSketch(Plane(origin=(40, 0, 40), x_dir=(0, 1, 0), z_dir=(0.7071067812, 0, 0.7071067812))):
        with Locations((72.954, -31.8198008825)):
            Circle(F2_R_2)
        with Locations((72.954, -31.8198008825)):
            Circle(F2_R, mode=Mode.SUBTRACT)
    extrude(amount=-F12_DEPTH)


with BuildPart() as f1_2:
    add(f1_1.part)

    # F13: union F12b, F12, F12d, F12c
    add(f12b.part)
    add(f12.part)
    add(f12d.part)
    add(f12c.part)


solid = f1_2.part
